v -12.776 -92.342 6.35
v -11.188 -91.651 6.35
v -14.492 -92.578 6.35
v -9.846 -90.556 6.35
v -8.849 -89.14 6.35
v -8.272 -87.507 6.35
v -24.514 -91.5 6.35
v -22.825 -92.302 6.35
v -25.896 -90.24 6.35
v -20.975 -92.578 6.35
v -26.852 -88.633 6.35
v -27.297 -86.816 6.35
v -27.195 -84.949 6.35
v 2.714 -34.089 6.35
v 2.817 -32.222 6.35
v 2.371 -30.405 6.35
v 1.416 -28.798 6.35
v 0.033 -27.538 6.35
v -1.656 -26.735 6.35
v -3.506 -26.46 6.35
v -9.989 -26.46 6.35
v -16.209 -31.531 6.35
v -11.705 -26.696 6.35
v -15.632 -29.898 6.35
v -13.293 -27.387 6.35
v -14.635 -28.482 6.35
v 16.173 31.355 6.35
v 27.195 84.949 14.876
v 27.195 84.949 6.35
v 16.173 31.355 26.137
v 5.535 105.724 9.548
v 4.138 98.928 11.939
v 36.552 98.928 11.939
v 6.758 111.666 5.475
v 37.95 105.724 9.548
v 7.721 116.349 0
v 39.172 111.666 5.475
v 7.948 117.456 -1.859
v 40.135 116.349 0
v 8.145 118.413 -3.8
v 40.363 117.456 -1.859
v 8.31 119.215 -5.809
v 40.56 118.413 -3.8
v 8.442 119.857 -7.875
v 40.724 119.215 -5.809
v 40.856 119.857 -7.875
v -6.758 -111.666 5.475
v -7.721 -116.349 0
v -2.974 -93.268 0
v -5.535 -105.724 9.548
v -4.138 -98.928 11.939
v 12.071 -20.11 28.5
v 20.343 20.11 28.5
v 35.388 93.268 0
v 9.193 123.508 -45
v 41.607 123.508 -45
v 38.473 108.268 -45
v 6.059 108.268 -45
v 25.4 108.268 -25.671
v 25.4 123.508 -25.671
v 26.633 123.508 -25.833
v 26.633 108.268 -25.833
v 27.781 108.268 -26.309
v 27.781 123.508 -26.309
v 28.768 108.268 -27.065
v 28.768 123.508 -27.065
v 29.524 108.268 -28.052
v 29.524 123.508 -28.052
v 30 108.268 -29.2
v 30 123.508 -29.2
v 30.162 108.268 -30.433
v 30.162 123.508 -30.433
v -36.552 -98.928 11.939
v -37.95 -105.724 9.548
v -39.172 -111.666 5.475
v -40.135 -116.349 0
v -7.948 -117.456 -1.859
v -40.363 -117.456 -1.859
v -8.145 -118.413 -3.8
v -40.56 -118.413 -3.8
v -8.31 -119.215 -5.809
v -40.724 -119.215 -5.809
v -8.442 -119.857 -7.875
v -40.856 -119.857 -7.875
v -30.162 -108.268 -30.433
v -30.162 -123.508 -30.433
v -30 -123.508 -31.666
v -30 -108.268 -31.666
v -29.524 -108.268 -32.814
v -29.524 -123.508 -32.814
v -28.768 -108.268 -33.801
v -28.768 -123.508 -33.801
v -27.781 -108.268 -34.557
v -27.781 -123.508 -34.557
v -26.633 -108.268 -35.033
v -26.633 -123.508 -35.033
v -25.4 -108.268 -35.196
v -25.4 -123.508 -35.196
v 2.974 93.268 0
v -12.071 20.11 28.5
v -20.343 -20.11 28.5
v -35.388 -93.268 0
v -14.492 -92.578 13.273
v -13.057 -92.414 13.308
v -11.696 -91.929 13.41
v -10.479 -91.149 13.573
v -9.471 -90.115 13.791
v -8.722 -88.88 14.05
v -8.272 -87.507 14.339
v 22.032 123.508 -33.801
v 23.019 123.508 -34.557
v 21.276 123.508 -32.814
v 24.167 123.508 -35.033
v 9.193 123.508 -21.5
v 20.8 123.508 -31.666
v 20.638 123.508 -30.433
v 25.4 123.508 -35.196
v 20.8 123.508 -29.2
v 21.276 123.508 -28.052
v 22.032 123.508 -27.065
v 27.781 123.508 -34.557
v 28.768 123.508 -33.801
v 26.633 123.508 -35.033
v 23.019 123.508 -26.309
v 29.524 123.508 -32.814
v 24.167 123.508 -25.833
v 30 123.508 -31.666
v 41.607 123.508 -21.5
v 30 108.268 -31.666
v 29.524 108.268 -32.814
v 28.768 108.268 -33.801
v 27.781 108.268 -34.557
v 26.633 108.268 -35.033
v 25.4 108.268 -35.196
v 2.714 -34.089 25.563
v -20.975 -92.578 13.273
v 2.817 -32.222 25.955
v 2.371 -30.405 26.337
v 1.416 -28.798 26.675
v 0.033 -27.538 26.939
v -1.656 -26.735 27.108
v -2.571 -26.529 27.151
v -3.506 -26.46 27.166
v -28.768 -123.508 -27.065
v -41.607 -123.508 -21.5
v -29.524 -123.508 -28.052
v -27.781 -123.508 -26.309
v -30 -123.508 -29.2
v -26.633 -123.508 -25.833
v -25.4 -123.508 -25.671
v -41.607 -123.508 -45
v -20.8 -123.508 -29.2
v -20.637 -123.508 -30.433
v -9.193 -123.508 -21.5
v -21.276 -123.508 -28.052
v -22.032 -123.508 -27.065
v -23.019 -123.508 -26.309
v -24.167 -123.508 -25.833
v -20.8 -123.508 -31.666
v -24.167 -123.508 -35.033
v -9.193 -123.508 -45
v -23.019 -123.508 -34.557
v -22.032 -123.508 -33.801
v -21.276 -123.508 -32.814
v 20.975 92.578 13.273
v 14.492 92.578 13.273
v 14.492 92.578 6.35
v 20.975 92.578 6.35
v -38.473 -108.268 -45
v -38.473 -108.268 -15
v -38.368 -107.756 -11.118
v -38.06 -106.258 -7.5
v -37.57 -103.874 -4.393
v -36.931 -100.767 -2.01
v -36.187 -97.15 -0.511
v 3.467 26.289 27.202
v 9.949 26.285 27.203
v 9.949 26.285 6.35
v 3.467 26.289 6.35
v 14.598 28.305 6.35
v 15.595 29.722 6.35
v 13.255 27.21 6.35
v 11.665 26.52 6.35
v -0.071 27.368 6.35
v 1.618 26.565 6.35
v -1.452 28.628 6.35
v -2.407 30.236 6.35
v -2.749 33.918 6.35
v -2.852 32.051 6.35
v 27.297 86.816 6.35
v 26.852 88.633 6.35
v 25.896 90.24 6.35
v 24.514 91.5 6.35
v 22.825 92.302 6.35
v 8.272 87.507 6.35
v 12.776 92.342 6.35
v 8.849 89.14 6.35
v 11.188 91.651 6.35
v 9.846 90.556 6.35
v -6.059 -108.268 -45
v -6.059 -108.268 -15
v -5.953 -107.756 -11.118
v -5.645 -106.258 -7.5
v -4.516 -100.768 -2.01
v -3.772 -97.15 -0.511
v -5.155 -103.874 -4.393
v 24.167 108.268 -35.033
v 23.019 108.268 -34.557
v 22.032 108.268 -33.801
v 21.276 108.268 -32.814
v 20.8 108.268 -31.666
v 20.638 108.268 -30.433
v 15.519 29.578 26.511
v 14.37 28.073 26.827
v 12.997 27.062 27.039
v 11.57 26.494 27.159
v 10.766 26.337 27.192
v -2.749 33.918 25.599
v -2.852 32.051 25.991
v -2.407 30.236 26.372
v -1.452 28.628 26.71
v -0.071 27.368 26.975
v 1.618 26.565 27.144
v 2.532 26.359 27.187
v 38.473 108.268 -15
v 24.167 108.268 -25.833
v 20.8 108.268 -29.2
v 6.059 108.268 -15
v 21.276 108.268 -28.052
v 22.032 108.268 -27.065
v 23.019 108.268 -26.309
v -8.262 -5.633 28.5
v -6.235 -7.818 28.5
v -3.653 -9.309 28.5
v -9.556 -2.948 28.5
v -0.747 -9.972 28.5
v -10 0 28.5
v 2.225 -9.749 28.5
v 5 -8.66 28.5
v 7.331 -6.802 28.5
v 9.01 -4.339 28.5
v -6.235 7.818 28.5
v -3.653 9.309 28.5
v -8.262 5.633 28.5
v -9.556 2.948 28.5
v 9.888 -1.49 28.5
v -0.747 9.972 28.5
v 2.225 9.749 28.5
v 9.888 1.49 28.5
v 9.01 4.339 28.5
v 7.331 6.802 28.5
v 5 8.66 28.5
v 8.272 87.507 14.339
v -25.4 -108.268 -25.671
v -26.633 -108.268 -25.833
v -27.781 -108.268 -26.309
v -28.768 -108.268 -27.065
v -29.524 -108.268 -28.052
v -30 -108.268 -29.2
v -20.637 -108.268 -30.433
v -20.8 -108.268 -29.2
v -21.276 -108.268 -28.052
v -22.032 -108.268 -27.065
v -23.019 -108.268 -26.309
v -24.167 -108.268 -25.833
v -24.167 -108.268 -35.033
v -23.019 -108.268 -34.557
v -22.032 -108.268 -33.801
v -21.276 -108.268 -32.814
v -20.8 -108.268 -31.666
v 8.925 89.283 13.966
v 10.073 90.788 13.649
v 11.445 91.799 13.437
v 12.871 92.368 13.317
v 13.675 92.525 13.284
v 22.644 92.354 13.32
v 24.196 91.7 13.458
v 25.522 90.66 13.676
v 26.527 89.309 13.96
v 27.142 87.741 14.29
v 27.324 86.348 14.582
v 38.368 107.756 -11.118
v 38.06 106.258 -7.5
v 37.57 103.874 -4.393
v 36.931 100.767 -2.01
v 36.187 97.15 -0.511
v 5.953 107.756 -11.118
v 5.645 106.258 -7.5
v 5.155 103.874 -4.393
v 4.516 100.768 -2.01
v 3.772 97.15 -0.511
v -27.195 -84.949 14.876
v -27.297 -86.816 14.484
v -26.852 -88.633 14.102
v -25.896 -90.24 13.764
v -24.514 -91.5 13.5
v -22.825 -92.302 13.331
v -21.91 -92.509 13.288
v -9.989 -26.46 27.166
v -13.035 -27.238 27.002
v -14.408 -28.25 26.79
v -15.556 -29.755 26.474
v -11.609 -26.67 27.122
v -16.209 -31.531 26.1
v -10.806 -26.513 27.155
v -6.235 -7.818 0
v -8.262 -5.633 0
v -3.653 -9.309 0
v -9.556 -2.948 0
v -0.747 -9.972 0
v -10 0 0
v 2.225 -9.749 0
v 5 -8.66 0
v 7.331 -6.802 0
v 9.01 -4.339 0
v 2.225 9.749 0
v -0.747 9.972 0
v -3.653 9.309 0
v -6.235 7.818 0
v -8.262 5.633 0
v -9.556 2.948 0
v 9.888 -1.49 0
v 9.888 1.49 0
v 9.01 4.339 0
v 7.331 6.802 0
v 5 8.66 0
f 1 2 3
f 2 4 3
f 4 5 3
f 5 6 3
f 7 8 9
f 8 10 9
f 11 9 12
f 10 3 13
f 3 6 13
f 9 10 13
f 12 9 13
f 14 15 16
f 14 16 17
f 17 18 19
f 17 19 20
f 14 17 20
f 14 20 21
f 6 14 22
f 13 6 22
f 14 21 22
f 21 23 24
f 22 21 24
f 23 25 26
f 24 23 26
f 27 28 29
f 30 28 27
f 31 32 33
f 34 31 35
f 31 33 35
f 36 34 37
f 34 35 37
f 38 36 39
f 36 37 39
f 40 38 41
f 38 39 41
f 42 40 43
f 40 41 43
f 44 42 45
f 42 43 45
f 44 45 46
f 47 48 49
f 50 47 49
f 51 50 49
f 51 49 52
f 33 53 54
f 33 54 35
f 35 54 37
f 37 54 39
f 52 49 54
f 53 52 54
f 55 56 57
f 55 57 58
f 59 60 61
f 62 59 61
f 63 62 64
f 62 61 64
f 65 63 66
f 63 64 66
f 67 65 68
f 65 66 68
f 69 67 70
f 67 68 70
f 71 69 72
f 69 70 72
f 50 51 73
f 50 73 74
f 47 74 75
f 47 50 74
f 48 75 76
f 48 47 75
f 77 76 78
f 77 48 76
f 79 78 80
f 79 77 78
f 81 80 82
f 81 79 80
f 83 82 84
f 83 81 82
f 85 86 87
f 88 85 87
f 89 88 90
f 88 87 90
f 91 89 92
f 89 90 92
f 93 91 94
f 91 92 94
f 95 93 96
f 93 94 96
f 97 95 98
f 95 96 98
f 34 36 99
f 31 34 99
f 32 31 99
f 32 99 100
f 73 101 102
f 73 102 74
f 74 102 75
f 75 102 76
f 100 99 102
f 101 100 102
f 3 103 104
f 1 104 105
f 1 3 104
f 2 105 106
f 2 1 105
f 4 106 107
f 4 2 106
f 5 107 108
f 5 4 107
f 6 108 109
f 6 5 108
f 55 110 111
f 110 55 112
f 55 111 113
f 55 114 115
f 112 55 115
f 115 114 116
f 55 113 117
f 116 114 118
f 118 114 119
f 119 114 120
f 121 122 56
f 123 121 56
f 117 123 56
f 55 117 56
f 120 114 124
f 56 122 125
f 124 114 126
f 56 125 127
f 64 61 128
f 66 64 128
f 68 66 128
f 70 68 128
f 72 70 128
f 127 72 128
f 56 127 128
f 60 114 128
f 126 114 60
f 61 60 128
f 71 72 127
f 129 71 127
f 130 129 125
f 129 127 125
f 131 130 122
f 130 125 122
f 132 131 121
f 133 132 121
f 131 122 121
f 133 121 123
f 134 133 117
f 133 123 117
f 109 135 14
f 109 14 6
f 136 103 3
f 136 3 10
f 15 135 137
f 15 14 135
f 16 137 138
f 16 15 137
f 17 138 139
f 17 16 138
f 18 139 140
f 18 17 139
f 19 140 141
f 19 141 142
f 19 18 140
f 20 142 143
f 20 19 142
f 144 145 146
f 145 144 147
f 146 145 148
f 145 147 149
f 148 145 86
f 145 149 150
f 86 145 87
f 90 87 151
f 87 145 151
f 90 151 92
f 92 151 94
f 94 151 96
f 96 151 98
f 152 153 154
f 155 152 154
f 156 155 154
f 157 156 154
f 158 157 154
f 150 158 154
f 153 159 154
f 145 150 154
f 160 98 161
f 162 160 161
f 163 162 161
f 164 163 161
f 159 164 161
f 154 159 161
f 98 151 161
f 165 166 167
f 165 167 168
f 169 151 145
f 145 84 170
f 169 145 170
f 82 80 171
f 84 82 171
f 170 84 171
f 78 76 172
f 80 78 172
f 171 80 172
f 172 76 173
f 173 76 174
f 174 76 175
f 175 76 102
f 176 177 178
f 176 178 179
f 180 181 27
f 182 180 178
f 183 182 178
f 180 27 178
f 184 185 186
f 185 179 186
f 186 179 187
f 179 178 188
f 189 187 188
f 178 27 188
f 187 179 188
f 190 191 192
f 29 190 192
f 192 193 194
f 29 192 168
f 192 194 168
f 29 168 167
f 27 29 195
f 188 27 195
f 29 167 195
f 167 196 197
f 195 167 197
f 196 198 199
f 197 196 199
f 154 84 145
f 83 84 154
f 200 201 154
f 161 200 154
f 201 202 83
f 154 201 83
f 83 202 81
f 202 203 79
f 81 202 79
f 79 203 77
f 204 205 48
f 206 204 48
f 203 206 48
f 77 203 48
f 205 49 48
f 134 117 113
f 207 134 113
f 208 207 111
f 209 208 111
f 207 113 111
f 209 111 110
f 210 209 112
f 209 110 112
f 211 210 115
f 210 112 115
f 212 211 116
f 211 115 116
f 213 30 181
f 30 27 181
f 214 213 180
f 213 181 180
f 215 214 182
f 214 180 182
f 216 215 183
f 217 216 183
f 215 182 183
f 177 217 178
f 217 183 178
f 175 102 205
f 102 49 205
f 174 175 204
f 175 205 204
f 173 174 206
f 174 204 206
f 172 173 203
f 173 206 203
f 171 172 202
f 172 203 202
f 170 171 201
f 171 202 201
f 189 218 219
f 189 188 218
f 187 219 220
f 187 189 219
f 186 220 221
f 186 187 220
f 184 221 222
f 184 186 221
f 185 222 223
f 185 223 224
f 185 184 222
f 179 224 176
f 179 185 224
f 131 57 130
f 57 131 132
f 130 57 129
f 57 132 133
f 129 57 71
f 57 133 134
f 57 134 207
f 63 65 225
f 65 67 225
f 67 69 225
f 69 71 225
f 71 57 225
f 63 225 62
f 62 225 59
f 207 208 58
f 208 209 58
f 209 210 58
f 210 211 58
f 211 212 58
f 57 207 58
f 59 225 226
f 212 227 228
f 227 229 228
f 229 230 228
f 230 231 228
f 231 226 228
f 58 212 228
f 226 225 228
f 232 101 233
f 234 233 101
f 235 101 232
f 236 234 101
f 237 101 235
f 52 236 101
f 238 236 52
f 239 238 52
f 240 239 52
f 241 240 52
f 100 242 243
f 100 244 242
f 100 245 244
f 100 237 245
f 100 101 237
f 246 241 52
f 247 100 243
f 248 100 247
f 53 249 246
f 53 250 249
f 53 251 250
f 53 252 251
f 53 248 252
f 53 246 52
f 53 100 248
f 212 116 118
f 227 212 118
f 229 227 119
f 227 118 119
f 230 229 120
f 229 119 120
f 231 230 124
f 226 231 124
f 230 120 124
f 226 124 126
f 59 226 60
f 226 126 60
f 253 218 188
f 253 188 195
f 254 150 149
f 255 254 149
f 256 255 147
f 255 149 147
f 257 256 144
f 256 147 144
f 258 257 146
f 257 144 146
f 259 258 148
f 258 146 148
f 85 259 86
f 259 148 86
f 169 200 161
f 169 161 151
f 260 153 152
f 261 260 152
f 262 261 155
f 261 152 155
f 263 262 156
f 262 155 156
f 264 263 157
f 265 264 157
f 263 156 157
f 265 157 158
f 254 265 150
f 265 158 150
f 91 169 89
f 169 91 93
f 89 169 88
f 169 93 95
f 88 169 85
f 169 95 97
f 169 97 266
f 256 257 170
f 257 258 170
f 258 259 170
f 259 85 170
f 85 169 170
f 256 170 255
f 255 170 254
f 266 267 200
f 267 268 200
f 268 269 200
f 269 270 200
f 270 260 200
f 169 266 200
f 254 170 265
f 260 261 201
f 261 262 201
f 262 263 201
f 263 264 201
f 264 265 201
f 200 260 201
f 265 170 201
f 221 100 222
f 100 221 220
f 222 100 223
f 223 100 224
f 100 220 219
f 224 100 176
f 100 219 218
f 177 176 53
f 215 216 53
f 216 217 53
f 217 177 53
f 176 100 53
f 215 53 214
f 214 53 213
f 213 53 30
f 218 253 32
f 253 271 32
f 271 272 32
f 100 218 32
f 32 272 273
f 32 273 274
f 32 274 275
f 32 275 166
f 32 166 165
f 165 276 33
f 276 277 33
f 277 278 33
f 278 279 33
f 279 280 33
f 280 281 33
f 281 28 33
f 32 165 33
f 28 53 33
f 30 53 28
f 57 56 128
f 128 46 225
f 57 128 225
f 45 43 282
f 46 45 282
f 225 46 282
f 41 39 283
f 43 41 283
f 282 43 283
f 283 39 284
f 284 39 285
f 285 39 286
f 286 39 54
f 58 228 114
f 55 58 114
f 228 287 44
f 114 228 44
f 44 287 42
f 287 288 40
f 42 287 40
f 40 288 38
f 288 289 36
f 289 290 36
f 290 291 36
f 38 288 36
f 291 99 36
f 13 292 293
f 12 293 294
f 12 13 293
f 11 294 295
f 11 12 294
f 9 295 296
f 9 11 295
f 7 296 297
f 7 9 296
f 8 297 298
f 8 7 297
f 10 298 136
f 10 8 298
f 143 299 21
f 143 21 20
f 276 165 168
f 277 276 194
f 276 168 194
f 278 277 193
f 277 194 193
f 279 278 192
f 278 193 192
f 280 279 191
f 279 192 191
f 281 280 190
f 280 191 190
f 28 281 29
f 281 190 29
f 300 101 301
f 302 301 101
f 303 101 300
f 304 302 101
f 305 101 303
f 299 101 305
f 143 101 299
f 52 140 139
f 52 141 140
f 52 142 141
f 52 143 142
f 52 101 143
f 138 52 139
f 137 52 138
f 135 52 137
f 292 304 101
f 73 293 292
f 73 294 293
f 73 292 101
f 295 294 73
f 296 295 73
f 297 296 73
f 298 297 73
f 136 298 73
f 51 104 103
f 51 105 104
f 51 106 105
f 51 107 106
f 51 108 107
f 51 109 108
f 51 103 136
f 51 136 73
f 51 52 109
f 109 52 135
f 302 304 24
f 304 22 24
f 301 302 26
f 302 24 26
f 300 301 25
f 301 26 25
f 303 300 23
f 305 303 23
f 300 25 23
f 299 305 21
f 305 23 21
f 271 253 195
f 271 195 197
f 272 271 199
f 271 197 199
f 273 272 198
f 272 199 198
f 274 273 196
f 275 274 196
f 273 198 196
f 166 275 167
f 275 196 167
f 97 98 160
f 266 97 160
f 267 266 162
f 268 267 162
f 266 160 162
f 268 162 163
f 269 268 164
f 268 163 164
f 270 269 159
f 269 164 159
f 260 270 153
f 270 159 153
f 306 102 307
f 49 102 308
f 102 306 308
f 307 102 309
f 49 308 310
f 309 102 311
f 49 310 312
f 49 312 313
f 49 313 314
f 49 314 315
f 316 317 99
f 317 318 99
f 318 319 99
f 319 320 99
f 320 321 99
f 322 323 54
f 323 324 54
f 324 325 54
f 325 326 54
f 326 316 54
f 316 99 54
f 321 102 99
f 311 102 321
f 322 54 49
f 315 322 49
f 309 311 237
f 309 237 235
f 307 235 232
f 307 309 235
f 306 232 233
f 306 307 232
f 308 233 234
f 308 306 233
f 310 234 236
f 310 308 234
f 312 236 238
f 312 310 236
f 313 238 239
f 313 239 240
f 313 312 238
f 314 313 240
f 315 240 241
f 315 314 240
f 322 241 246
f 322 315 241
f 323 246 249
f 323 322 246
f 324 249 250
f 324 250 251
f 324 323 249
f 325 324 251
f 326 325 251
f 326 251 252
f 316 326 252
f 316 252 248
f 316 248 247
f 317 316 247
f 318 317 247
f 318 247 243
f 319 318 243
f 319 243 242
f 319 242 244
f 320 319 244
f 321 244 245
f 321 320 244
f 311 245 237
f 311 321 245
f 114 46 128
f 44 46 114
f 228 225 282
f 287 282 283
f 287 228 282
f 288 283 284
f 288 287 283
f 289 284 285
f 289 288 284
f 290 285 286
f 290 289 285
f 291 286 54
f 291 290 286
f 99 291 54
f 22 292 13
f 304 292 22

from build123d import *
from OCP.BRepFilletAPI import BRepFilletAPI_MakeChamfer

# Parameters (mm, degrees)
SKETCH1_R           = 10
BOSS_EXTRUDE1_DEPTH = 28.5
BOSS_EXTRUDE2_DEPTH = 45
CUT_EXTRUDE1_DEPTH  = 30
CIRPATTERN1_COUNT   = 2
CHAMFER1_SIZE       = 50
CHAMFER1_SIZE2      = 13.397459622
FILLET3_R           = 15
CHAMFER2_SIZE       = 90
CHAMFER2_SIZE2      = 13.607292824
CUT_EXTRUDE2_DEPTH  = 138.877715566
CUT_EXTRUDE4_DEPTH  = 22.15
FILLET6_R           = 6.35


with BuildPart() as part:
    # Sketch1 → Boss-Extrude1 (new body)
    with BuildSketch(Plane.XY):
        Polygon((-9.192766332, -123.5075), (41.607233668, 123.5075), (9.192766332, 123.5075), (-41.607233668, -123.5075), align=None)
        with Locations(Location((0, 0, 0), (0, 0, 180))):
            Circle(SKETCH1_R, mode=Mode.SUBTRACT)
    extrude(amount=BOSS_EXTRUDE1_DEPTH)

    # Sketch2 → Boss-Extrude2 (add)
    with BuildSketch(Plane(origin=(0, 0, 0), x_dir=(-1, 0, 0), z_dir=(0, 0, -1))):
        Polygon((-41.607233668, 123.5075), (-38.473043437, 108.2675), (-6.0585761, 108.2675), (-9.192766332, 123.5075), align=None)
        Polygon((38.473043437, -108.2675), (6.0585761, -108.2675), (9.192766332, -123.5075), (41.607233668, -123.5075), align=None)
    extrude(amount=BOSS_EXTRUDE2_DEPTH)

    # Sketch4 → Cut-Extrude1 (cut)
    with BuildSketch(Plane(origin=(0, 123.5075, 0), x_dir=(1, 0, 0), z_dir=(0, 1, 0))):
        with BuildLine():
            ThreePointArc((20.6375, 30.433032299), (22.032403955, 27.065436254), (25.4, 25.670532299))
            Line((25.4, 25.670532299), (25.4, 30.433032299))
            Line((25.4, 30.433032299), (20.6375, 30.433032299))
        make_face()
        with BuildLine():
            Line((25.4, 30.433032299), (25.4, 25.670532299))
            ThreePointArc((25.4, 25.670532299), (28.767596045, 27.065436254), (30.1625, 30.433032299))
            Line((30.1625, 30.433032299), (25.4, 30.433032299))
        make_face()
        with BuildLine():
            Line((20.6375, 30.433032299), (25.4, 30.433032299))
            Line((25.4, 30.433032299), (25.4, 35.195532299))
            ThreePointArc((25.4, 35.195532299), (22.032403955, 33.800628344), (20.6375, 30.433032299))
        make_face()
        with BuildLine():
            Line((25.4, 35.195532299), (25.4, 30.433032299))
            Line((25.4, 30.433032299), (30.1625, 30.433032299))
            ThreePointArc((30.1625, 30.433032299), (28.767596045, 33.800628344), (25.4, 35.195532299))
        make_face()
    cut_extrude1 = extrude(amount=-CUT_EXTRUDE1_DEPTH, mode=Mode.SUBTRACT)

    # CirPattern1: Cut-Extrude1 ×2 about axis
    cirpattern1_axis = Axis((0, 0, 28.5), (0, 0, -1))
    for i in range(1, CIRPATTERN1_COUNT):
        add(cut_extrude1.rotate(cirpattern1_axis, i * 360 / CIRPATTERN1_COUNT), mode=Mode.SUBTRACT)

    # Chamfer1: one chamfer whose edges measure the first distance from different faces: ONE call of the kernel's chamfer builder (chamfer() names one face for all edges)
    chamfer1_edges_1 = [part.edges().sort_by_distance(p)[0] for p in [
        (-25.4, -123.5075, 28.5),
    ]]
    chamfer1_side_1 = [part.faces().sort_by_distance(p)[0] for p in [
        (-25.4, -123.5075, -7.566085514),
    ]]
    chamfer1_edges_2 = [part.edges().sort_by_distance(p)[0] for p in [
        (25.4, 123.5075, 28.5),
    ]]
    chamfer1_side_2 = [part.faces().sort_by_distance(p)[0] for p in [
        (25.4, 123.5075, -7.566085514),
    ]]
    chamfer1 = BRepFilletAPI_MakeChamfer(part.part.solid().wrapped)
    for e in chamfer1_edges_1:
        chamfer1.Add(CHAMFER1_SIZE, CHAMFER1_SIZE2, e.wrapped, chamfer1_side_1[0].wrapped)  # the first distance lies on this face
    for e in chamfer1_edges_2:
        chamfer1.Add(CHAMFER1_SIZE, CHAMFER1_SIZE2, e.wrapped, chamfer1_side_2[0].wrapped)  # the first distance lies on this face
    add(Compound.cast(chamfer1.Shape()), mode=Mode.REPLACE)

    # Fillet3
    fillet3_edges = [part.edges().sort_by_distance(p)[0] for p in [
        (22.265809769, 108.2675, 0),
        (-22.265809769, -108.2675, 0),
    ]]
    fillet(fillet3_edges, radius=FILLET3_R)

    # Chamfer2
    chamfer2_edges = [part.edges().sort_by_distance(p)[0] for p in [
        (-22.644738381, -110.110040378, 28.5),
        (22.644738381, 110.110040378, 28.5),
    ]]
    chamfer2_side = [part.faces().sort_by_distance(p)[0] for p in [
        (13.919836124, 0.470415947, 28.5),
    ]]
    chamfer(chamfer2_edges, length=CHAMFER2_SIZE, length2=CHAMFER2_SIZE2, reference=chamfer2_side[0])

    # Sketch10 → Cut-Extrude2 (cut, symmetric)
    with BuildSketch(Plane(origin=(0, 0, 0), x_dir=(0, 0, -1), z_dir=(1, 0, 0))):
        with BuildLine():
            Line((-28.5, 20.110040378), (-11.939027322, 98.927851264))
            ThreePointArc((-11.939027322, 98.927851264), (-4.989688501, 112.1926981), (7.875417438, 119.856804105))
            Line((7.875417438, 119.856804105), (-24.698068362, 128.387749722))
            Line((-24.698068362, 128.387749722), (-33.956814005, 23.522391457))
            Line((-33.956814005, 23.522391457), (-28.5, 20.110040378))
        make_face()
    cut_extrude2 = extrude(amount=CUT_EXTRUDE2_DEPTH, both=True, mode=Mode.SUBTRACT)

    # Mirror1: Cut-Extrude2 across plane
    add(cut_extrude2.mirror(Plane.ZX), mode=Mode.SUBTRACT)

    # Sketch11 → Cut-Extrude4 (cut)
    with BuildSketch(Plane.XY.offset(28.5)):
        Polygon((15.129215341, 26.281205366), (-4.316825144, 26.294041963), (9.314806588, 92.577851264), (28.763486991, 92.577851264), align=None)
        Polygon((-15.165993749, -26.460040378), (4.282686653, -26.460040378), (-9.314806588, -92.577851264), (-28.763486991, -92.577851264), align=None)
    extrude(amount=-CUT_EXTRUDE4_DEPTH, mode=Mode.SUBTRACT)

    # Fillet6
    fillet6_edges = [part.edges().sort_by_distance(p)[0] for p in [
        (15.129215341, 26.281205366, 16.776666244),
        (-4.316825144, 26.294041963, 16.775317649),
        (9.314806588, 92.577851264, 9.811635567),
        (28.763486991, 92.577851264, 9.811635567),
        (-28.763486991, -92.577851264, 9.811635567),
        (-9.314806588, -92.577851264, 9.811635567),
        (4.282686653, -26.460040378, 16.757878094),
        (-15.165993749, -26.460040378, 16.757878094),
    ]]
    fillet(fillet6_edges, radius=FILLET6_R)


solid = part.part
